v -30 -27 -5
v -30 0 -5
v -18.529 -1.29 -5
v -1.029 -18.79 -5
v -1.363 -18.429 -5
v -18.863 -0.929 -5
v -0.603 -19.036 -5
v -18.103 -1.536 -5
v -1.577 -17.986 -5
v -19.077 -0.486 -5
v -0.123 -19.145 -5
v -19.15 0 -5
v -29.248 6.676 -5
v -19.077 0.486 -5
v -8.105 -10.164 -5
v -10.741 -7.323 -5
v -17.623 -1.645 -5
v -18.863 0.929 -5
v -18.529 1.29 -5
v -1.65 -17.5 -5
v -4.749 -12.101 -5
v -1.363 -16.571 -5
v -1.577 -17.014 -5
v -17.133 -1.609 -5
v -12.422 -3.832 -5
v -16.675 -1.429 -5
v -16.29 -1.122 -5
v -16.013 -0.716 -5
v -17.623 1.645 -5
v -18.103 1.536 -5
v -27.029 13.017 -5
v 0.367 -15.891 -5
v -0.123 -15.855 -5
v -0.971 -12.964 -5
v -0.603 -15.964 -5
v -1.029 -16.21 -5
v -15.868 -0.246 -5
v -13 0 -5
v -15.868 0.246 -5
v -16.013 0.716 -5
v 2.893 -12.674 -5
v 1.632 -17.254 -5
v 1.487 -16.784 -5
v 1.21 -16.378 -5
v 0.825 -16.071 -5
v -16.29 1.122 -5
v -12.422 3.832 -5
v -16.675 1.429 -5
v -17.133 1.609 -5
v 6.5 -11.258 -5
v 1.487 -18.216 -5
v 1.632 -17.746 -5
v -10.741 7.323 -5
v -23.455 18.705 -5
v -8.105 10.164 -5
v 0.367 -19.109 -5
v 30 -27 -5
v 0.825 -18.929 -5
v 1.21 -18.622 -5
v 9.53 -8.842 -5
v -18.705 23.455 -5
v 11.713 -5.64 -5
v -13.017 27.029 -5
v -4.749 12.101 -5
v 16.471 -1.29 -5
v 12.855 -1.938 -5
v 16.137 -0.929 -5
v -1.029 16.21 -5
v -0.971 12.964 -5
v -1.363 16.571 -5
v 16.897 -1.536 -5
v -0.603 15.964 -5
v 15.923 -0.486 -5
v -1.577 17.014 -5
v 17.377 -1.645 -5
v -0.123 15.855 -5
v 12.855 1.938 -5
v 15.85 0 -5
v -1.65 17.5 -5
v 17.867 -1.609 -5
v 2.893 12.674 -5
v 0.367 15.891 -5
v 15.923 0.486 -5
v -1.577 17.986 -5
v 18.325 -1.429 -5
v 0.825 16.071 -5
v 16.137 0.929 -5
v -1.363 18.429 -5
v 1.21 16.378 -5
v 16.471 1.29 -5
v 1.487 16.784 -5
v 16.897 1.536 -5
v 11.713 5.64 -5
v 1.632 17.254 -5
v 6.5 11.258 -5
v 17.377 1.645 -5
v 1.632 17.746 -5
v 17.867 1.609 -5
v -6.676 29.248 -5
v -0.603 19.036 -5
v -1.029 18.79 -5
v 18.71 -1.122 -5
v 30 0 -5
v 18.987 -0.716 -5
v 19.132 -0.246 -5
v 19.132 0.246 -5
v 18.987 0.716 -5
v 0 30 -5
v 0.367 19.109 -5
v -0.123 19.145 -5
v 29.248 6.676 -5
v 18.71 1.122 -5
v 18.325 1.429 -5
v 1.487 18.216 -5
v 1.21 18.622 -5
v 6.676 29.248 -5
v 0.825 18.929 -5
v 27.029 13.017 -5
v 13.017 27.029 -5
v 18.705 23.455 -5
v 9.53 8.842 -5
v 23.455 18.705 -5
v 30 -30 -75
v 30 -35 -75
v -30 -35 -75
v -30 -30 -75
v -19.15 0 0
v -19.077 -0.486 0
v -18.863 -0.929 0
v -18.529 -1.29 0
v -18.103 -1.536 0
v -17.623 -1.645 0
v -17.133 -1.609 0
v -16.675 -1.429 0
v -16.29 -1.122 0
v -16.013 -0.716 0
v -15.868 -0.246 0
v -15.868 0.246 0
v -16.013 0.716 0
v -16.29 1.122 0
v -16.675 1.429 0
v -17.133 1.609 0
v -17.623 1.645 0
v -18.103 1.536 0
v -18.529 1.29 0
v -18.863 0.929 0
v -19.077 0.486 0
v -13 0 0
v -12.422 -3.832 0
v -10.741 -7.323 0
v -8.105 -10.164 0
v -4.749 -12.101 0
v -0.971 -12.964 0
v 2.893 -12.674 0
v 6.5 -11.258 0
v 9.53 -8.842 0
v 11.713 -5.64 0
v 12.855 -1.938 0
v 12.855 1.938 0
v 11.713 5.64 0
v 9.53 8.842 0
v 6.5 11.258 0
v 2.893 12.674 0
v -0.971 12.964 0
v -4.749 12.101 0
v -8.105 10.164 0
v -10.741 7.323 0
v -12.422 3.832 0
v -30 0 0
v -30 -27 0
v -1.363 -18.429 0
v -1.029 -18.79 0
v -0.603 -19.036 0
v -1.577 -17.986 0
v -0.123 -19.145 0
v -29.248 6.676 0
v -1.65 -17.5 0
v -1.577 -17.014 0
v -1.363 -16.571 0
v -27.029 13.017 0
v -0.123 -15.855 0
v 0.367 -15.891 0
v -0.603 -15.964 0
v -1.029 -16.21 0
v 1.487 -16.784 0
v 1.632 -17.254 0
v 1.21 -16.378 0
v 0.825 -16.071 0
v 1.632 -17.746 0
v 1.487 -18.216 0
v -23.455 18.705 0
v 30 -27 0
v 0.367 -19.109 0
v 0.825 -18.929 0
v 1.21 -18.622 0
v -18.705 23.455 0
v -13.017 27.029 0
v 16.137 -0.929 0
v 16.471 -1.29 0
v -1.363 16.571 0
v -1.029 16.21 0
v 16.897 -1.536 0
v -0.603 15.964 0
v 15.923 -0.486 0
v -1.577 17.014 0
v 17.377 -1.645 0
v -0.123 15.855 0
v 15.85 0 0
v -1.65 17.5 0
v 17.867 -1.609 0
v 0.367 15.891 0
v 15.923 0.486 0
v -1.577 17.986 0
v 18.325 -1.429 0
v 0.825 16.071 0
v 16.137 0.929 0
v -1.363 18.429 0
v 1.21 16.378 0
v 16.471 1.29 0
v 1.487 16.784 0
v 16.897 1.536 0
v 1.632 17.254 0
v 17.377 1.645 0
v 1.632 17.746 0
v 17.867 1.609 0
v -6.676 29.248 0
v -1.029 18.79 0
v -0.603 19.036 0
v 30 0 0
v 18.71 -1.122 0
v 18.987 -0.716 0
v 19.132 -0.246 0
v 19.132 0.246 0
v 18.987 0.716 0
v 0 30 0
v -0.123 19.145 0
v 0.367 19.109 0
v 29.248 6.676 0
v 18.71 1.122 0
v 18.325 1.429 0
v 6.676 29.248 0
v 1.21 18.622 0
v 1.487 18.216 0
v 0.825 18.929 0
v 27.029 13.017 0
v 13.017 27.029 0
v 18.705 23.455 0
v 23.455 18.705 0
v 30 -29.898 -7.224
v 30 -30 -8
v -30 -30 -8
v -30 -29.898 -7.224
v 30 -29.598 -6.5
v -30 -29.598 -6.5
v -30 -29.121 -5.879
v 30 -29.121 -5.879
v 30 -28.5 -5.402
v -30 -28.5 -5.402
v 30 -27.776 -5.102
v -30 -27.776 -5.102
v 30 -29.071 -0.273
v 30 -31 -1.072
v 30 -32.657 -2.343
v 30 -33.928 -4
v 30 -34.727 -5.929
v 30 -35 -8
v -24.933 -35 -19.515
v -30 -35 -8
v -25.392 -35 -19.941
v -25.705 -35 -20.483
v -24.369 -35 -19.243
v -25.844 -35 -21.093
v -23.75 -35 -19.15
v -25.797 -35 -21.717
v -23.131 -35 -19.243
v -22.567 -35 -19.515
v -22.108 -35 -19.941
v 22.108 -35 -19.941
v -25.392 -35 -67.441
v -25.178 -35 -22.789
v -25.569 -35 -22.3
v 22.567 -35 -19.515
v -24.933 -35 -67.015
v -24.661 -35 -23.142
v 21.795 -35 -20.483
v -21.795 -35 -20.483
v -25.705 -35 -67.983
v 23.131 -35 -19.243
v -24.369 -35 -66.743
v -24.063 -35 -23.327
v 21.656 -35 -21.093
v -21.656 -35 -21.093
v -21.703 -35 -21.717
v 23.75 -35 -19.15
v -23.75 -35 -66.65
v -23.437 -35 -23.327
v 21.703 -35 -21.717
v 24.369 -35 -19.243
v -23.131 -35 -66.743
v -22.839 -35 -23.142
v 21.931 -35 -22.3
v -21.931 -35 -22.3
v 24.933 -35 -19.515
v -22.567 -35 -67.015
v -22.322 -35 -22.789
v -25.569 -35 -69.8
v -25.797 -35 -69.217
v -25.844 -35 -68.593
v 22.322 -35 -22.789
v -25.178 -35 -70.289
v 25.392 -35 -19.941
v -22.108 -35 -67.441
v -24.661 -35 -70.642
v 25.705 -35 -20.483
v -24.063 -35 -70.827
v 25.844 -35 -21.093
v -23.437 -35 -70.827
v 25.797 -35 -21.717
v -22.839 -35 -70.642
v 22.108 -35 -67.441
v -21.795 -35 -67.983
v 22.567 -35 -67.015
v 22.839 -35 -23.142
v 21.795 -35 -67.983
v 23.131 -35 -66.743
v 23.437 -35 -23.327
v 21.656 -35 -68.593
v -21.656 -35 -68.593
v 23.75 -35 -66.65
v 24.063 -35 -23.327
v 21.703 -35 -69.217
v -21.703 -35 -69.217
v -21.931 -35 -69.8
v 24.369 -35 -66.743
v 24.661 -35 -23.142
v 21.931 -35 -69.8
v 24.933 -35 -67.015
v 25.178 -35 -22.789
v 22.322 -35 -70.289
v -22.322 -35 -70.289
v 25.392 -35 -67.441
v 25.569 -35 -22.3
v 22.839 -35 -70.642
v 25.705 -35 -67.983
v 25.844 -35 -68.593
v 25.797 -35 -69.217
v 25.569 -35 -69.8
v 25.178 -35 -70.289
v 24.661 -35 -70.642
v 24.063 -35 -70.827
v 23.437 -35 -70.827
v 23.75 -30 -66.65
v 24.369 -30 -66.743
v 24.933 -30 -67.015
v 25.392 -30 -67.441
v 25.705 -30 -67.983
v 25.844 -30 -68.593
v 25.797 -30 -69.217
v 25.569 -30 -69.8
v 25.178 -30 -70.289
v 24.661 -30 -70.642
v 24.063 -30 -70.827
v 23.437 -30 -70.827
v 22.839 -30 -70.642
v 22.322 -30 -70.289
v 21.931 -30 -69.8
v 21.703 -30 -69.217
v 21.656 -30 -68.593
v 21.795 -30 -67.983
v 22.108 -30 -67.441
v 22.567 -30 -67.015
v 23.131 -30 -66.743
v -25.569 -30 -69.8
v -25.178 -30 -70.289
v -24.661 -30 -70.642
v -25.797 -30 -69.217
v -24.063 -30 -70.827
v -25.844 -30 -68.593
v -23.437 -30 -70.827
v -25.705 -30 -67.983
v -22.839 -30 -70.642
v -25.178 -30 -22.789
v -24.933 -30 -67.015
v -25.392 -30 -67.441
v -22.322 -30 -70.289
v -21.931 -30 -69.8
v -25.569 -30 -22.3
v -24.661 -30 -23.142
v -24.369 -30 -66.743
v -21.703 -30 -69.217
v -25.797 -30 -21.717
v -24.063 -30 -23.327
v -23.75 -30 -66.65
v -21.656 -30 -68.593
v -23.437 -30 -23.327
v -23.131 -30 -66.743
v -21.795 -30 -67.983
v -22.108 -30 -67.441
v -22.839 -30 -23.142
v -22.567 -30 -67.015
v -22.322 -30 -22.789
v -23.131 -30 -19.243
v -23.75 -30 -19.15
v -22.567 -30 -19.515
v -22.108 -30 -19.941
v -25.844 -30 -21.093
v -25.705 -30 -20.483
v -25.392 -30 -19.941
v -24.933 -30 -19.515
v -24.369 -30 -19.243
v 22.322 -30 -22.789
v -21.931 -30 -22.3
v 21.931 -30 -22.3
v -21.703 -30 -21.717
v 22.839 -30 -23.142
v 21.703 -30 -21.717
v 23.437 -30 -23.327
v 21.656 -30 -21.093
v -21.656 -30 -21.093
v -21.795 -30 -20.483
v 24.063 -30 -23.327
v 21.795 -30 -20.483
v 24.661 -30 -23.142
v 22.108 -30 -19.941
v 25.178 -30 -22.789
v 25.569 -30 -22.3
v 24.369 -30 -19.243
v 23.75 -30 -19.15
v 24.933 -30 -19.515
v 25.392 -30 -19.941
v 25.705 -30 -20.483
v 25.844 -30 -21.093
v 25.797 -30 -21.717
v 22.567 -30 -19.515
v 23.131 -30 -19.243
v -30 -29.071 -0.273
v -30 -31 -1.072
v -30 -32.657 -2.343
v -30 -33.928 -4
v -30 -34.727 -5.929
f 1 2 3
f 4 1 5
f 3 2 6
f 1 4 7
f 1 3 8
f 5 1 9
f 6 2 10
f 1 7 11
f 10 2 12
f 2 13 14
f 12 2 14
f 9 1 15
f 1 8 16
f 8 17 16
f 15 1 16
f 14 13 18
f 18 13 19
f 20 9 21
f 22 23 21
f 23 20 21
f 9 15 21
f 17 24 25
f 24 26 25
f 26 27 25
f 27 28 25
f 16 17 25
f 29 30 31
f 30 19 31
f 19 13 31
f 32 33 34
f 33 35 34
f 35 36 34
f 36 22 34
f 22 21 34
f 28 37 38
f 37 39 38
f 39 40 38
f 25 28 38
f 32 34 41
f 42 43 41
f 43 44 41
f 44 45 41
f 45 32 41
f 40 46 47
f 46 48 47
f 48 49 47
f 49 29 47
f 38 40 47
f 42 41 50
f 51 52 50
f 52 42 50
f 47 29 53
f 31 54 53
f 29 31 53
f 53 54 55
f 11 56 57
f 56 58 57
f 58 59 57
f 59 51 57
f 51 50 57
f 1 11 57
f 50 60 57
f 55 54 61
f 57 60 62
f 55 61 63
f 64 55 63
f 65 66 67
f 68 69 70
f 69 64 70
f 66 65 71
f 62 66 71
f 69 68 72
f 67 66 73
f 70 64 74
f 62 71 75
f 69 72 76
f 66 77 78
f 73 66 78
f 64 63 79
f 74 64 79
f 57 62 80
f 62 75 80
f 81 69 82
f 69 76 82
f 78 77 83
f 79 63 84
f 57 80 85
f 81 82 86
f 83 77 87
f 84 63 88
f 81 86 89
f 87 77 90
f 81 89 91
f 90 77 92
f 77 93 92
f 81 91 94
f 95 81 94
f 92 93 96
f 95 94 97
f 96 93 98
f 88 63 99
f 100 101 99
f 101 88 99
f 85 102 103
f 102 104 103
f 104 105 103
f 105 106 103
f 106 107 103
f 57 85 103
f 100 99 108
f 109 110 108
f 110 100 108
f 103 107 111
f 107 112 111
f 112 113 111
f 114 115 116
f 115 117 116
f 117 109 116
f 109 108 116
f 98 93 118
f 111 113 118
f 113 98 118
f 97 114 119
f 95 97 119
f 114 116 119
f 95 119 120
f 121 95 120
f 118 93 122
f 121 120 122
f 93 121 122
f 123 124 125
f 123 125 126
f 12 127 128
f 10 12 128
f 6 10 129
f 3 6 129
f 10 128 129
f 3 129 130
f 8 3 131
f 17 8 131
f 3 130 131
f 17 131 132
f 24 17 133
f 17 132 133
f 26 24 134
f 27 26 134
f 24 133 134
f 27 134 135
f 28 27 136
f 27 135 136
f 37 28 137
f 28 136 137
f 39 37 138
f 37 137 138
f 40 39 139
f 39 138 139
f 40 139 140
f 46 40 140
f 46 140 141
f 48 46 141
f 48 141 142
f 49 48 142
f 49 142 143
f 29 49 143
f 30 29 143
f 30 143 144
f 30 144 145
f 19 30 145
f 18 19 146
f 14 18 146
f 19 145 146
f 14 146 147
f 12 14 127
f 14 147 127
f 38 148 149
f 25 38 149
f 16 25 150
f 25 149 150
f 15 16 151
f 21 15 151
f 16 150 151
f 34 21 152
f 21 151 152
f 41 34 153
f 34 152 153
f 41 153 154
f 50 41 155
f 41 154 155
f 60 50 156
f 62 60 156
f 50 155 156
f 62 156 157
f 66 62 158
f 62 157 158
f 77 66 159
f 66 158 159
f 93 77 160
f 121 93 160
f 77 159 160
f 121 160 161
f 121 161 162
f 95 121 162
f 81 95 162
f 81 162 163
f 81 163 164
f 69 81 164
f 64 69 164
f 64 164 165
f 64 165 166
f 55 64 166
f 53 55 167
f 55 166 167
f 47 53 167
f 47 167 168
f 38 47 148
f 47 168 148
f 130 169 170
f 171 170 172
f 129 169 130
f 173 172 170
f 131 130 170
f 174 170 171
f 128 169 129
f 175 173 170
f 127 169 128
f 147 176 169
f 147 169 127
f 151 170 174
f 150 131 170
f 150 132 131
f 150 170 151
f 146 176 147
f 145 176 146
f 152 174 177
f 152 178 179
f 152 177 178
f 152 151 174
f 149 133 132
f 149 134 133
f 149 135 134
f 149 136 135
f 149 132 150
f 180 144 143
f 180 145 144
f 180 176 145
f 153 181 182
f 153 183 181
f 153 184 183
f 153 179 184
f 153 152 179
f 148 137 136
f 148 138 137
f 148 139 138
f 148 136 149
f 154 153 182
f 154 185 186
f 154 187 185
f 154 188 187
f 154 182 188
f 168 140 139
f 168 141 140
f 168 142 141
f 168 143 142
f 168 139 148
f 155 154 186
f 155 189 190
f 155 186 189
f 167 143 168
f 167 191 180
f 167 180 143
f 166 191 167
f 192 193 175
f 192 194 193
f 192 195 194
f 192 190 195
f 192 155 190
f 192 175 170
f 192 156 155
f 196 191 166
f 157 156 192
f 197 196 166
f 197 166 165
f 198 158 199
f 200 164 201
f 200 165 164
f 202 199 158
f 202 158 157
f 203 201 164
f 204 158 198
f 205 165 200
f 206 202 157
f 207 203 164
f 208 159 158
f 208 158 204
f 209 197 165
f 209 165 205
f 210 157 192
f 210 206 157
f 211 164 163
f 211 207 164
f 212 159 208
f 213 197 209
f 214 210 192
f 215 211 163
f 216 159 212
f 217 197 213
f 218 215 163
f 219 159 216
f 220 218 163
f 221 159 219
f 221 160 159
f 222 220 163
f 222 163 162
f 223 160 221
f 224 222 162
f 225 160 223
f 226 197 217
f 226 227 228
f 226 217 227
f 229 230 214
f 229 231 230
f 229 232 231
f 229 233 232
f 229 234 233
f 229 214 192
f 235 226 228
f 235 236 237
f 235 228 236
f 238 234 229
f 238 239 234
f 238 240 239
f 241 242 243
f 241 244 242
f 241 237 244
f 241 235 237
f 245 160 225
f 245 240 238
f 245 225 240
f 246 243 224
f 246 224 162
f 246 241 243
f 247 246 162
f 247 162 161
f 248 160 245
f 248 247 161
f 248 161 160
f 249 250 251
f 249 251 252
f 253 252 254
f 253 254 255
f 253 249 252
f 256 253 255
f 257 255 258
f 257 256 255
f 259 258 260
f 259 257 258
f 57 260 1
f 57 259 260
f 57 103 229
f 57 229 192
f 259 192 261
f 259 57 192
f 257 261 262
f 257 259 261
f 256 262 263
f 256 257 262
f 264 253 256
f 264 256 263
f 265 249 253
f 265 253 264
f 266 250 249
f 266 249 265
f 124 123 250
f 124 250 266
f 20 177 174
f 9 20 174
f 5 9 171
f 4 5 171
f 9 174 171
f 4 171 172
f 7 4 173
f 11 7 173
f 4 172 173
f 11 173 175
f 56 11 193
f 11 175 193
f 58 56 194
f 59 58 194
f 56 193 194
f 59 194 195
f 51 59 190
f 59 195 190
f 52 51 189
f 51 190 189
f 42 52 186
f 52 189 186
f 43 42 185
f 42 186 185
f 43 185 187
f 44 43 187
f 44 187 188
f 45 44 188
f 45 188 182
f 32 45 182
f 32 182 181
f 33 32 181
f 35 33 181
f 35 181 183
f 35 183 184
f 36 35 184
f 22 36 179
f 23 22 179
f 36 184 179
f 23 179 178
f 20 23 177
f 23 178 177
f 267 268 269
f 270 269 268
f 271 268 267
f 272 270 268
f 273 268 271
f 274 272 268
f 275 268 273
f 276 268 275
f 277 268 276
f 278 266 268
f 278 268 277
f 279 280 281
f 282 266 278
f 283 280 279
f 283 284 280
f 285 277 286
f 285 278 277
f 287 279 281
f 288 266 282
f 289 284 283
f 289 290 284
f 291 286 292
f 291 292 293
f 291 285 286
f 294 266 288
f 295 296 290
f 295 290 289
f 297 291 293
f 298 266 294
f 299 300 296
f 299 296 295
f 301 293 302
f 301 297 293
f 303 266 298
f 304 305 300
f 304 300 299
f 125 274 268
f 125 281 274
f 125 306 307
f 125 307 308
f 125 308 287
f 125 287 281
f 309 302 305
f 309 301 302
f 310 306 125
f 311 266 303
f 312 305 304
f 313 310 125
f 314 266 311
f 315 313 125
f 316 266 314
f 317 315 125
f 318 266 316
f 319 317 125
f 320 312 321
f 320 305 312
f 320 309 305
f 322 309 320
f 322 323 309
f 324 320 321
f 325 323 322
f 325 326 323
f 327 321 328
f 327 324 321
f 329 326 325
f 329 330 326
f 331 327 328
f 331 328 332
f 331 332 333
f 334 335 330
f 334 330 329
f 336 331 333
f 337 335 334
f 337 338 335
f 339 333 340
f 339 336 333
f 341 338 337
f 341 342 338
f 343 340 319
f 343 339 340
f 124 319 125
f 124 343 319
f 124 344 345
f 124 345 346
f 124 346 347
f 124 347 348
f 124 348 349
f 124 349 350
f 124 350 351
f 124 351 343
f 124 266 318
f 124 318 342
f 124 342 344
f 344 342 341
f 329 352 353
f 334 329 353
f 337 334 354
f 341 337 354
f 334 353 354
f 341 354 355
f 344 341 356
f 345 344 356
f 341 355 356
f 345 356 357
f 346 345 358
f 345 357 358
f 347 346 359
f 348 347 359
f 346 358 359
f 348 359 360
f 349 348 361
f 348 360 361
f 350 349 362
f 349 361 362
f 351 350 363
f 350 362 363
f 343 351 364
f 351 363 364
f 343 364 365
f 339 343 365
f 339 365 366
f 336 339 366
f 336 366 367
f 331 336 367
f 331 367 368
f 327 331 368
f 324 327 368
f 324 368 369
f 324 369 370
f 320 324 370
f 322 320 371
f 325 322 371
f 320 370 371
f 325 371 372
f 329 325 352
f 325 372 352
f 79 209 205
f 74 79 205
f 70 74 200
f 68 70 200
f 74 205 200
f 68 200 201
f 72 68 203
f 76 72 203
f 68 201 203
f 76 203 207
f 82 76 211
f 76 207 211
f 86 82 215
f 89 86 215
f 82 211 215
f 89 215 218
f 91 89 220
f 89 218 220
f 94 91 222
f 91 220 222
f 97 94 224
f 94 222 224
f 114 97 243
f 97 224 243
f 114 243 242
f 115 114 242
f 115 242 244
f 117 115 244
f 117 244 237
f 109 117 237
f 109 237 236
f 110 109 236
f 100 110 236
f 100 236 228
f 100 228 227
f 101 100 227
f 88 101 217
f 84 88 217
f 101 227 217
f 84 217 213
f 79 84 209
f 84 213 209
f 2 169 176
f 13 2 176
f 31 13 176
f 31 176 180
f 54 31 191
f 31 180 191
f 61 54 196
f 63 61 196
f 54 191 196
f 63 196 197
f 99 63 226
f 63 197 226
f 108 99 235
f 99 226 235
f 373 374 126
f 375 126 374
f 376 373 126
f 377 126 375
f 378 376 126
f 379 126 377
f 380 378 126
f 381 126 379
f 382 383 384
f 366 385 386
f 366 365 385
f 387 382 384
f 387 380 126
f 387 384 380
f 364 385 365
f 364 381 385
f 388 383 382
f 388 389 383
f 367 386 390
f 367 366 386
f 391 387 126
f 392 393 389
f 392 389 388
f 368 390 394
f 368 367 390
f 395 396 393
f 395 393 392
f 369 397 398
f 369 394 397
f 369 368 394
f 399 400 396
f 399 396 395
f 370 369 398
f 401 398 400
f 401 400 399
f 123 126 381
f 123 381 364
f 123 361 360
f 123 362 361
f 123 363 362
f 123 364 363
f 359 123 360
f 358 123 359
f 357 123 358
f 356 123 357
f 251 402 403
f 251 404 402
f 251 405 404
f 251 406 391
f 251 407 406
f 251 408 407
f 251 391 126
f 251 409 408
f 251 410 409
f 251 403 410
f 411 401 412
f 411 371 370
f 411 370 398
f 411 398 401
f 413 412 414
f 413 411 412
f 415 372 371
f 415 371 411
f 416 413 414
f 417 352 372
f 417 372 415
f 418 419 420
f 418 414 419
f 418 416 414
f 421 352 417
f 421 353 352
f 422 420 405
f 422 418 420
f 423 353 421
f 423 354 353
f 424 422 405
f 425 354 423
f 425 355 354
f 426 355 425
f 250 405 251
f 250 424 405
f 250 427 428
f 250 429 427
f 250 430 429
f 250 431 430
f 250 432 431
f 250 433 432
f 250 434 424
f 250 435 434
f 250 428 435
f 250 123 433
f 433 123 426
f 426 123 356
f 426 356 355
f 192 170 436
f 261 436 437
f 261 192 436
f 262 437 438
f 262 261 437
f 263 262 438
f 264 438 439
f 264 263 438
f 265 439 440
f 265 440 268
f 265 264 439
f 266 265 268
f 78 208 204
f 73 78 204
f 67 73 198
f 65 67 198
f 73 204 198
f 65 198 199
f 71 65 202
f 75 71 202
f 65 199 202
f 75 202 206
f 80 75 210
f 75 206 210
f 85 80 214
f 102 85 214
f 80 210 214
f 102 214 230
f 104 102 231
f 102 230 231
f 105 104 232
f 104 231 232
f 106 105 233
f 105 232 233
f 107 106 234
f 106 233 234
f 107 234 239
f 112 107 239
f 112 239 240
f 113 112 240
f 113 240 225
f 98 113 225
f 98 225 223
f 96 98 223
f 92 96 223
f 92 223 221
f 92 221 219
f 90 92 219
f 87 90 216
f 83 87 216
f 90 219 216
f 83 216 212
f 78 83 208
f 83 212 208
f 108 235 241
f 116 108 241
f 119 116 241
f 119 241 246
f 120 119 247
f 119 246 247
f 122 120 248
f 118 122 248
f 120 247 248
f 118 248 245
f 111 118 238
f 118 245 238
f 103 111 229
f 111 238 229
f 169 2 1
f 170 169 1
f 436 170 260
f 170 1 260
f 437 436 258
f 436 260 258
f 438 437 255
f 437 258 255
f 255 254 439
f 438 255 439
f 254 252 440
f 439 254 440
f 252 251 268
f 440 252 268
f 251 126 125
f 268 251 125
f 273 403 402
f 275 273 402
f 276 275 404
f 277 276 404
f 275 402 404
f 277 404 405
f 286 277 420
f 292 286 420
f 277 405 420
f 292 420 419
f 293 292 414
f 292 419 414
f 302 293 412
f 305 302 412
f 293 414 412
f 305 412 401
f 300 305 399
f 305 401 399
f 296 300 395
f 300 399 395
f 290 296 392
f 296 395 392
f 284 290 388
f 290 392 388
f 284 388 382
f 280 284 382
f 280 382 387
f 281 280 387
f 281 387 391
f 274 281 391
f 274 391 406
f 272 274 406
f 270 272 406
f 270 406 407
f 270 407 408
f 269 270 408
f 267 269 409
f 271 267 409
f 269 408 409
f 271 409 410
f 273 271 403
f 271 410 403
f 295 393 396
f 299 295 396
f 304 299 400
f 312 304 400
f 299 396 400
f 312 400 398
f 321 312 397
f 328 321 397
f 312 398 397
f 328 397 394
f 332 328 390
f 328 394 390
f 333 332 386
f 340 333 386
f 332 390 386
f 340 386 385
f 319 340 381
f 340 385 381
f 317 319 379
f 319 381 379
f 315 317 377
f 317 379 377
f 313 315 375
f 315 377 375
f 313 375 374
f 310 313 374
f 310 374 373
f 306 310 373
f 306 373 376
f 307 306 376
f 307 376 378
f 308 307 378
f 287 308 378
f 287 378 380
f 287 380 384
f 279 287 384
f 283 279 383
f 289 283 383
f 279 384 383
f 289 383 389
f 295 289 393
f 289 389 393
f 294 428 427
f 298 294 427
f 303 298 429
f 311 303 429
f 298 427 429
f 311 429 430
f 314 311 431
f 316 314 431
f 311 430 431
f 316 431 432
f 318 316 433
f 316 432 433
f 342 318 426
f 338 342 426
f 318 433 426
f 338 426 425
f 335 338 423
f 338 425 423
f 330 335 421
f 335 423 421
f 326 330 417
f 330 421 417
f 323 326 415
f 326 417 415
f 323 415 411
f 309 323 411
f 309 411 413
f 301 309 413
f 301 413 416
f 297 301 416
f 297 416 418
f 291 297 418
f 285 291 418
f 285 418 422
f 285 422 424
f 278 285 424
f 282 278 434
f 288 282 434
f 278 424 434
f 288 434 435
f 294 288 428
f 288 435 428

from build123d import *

# Parameters (mm, degrees)
SKETCH_10_W                      = 60
SKETCH_10_H                      = 60
SM_BASE_FLANGE_2_DEPTH           = 5
SM_EDGE_FLANGE_2_STRIP_W         = 26
SM_EDGE_FLANGE_2_STRIP_H         = 5
SM_EDGE_FLANGE_2_STRIP_CUT_DEPTH = 60
SM_EDGE_FLANGE_2_DEPTH           = 60
SKETCH_19_R                      = 1.65
SKETCH_19_R_2                    = 13
CUT_EXTRUDE_2_DEPTH              = 5
CUT_EXTRUDE_START                = -30
SKETCH_28_R                      = 2.1
CUT_EXTRUDE_4_DEPTH              = 5
CUT_EXTRUDE_5_DEPTH              = 5


# Sheet-metal steps are written as plain solids
with BuildPart() as part:
    # 草图10 → 基体-法兰2 (new body)
    with BuildSketch(Plane.XY):
        Rectangle(SKETCH_10_W, SKETCH_10_H)
    extrude(amount=-SM_BASE_FLANGE_2_DEPTH)

    # 边线-法兰2 strip (across the edge) → 边线-法兰2 strip cut (cut)
    with BuildSketch(Plane(origin=(30, -30, -5), x_dir=(0, 1, 0), z_dir=(-1, 0, 0))):
        with Locations((-10, -2.5)):
            Rectangle(SM_EDGE_FLANGE_2_STRIP_W, SM_EDGE_FLANGE_2_STRIP_H)
    extrude(amount=SM_EDGE_FLANGE_2_STRIP_CUT_DEPTH, mode=Mode.SUBTRACT)

    # 边线-法兰2 section (across the edge) → 边线-法兰2 (add)
    with BuildSketch(Plane(origin=(30, -30, -5), x_dir=(0, 1, 0), z_dir=(-1, 0, 0))):
        with BuildLine():
            Line((-5, 3), (-5, 70))
            Line((-5, 70), (0, 70))
            Line((0, 70), (0, 3))
            ThreePointArc((0, 3), (0.878679656, 0.878679656), (3, 0))
            Line((3, 0), (3, -5))
            ThreePointArc((3, -5), (-2.656854249, -2.656854249), (-5, 3))
        make_face()
    extrude(amount=SM_EDGE_FLANGE_2_DEPTH)

    # 草图19 → 切除-拉伸2 (cut)
    with BuildSketch(Plane.XY):
        with Locations(Location((-17.5, 0, 0), (0, 0, 180))):
            Circle(SKETCH_19_R)
        with Locations(Location((17.5, 0, 0), (0, 0, 180))):
            Circle(SKETCH_19_R)
        with Locations(Location((0, 17.5, 0), (0, 0, 180))):
            Circle(SKETCH_19_R)
        with Locations(Location((0, -17.5, 0), (0, 0, 180))):
            Circle(SKETCH_19_R)
        with Locations(Location((0, 0, 0), (0, 0, 180))):
            Circle(SKETCH_19_R_2)
    extrude(amount=-CUT_EXTRUDE_2_DEPTH, mode=Mode.SUBTRACT)

    # 草图28 → 切除-拉伸4 (cut)
    with BuildSketch(Plane(origin=(0, 0, 0), x_dir=(1, 0, 0), z_dir=(0, 1, 0)).offset(CUT_EXTRUDE_START)):
        with Locations(Location((-23.75, 21.25, 0), (0, 0, 270))):
            Circle(SKETCH_28_R)
        with Locations(Location((-23.75, 68.75, 0), (0, 0, 270))):
            Circle(SKETCH_28_R)
        with Locations(Location((23.75, 68.75, 0), (0, 0, 270))):
            Circle(SKETCH_28_R)
        with Locations(Location((23.75, 21.25, 0), (0, 0, 270))):
            Circle(SKETCH_28_R)
    extrude(amount=-CUT_EXTRUDE_4_DEPTH, mode=Mode.SUBTRACT)

    # 草图29 → 切除-拉伸5 (cut)
    with BuildSketch(Plane.XY):
        with BuildLine():
            ThreePointArc((-30, 0), (-21.213203436, 21.213203436), (0, 30))
            Line((0, 30), (-30, 30))
            Line((-30, 30), (-30, 0))
        make_face()
        with BuildLine():
            Line((30, 30), (0, 30))
            ThreePointArc((0, 30), (21.213203436, 21.213203436), (30, 0))
            Line((30, 0), (30, 30))
        make_face()
    extrude(amount=-CUT_EXTRUDE_5_DEPTH, mode=Mode.SUBTRACT)


solid = part.part
